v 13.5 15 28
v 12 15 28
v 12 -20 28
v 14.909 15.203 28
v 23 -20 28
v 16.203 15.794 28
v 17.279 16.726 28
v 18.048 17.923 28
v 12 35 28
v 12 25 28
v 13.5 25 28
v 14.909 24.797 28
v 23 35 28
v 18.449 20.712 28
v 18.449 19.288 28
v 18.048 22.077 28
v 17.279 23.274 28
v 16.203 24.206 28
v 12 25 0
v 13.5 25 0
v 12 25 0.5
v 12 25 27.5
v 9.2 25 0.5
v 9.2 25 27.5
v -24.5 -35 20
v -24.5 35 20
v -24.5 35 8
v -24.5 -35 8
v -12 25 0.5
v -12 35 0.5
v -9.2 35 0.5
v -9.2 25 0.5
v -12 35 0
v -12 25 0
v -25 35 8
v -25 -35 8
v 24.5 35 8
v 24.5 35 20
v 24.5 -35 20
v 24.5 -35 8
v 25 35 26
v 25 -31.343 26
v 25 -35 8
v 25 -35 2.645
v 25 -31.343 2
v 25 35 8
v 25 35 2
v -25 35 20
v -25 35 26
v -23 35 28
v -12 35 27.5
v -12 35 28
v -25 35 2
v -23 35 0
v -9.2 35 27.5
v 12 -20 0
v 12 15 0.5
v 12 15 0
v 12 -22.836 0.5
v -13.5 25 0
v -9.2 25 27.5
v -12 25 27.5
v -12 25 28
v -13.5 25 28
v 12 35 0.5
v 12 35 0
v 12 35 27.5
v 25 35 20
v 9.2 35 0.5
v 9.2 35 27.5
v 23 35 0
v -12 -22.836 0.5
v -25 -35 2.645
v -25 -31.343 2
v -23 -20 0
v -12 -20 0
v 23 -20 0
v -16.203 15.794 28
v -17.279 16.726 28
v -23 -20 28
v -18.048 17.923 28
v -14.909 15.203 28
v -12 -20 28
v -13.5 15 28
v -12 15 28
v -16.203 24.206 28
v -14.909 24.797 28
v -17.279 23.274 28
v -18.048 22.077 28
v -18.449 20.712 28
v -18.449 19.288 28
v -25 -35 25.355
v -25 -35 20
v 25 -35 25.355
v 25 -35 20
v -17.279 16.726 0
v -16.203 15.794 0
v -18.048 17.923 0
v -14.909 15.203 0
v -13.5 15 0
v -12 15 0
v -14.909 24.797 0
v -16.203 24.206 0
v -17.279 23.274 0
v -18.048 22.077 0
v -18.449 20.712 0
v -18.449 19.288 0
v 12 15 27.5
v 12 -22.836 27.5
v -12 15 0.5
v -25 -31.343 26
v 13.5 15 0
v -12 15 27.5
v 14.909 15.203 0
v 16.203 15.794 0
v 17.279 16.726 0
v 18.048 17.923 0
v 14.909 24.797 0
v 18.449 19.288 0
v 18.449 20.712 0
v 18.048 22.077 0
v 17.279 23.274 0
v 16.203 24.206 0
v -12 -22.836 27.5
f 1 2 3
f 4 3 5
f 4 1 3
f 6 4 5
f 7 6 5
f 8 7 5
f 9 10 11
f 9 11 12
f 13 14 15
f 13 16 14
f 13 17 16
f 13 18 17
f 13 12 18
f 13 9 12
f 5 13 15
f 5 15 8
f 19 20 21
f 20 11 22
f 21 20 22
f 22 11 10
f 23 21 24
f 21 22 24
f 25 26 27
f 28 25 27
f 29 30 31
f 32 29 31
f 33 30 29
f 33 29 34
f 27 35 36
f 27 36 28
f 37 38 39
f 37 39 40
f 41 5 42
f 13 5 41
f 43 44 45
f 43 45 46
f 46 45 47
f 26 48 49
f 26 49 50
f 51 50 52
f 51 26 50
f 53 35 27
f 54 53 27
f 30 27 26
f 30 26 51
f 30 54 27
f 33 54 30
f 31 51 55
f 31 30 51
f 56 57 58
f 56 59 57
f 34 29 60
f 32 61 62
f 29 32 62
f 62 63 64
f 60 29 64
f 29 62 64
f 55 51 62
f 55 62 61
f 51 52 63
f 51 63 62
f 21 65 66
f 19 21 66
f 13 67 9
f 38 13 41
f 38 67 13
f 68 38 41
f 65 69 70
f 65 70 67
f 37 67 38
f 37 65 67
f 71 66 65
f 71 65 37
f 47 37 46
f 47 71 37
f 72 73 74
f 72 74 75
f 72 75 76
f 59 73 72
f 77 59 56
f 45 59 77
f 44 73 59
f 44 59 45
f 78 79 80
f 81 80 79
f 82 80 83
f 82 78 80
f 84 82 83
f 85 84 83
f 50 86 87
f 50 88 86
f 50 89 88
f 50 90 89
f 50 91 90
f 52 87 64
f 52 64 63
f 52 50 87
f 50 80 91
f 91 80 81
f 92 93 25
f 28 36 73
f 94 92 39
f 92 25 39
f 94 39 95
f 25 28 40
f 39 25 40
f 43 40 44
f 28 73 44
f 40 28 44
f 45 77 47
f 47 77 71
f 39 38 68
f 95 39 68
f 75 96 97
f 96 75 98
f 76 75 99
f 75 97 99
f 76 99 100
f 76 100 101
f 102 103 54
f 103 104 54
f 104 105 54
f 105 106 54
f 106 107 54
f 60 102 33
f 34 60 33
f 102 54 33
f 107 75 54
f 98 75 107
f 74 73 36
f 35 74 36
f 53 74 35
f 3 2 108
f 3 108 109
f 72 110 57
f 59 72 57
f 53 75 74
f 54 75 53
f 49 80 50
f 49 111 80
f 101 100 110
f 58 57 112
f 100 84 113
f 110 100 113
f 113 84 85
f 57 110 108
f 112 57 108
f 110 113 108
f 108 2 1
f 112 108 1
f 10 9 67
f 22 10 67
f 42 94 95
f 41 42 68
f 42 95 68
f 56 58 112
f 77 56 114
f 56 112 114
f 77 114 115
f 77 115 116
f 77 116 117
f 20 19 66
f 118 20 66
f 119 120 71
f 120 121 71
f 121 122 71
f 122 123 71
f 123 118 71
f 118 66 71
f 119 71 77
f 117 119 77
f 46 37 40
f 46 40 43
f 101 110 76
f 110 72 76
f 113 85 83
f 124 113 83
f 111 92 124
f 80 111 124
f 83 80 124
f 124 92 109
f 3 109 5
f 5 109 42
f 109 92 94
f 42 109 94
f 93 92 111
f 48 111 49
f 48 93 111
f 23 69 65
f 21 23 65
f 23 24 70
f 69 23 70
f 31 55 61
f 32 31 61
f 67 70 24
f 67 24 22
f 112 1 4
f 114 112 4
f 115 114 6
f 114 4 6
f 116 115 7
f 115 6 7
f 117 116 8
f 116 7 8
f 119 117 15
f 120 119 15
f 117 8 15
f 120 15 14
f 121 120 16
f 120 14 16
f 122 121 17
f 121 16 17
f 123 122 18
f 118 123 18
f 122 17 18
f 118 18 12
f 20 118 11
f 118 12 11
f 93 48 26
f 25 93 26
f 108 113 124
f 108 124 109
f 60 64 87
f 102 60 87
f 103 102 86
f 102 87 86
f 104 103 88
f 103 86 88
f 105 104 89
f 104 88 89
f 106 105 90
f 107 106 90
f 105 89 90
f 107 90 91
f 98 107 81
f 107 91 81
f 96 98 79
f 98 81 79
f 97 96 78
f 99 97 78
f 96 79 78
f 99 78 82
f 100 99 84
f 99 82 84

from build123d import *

# Parameters (mm, degrees)
SKETCH_1_W          = 50
SKETCH_1_H          = 70
EXTRUDE_1_DEPTH     = 28
CUT_EXTRUDE_6_DEPTH = 52.322509681
CHAMFER_1_SIZE      = 15
CHAMFER_1_SIZE2     = 2.644904711
CHAMFER_2_SIZE      = 15
CHAMFER_2_SIZE2     = 2.644904711
SKETCH_6_W          = 24
SKETCH_6_H          = 0.5
CUT_EXTRUDE_7_DEPTH = 80.429213769
SKETCH_7_W          = 0.5
SKETCH_7_H          = 12
CUT_EXTRUDE_8_DEPTH = 80.429213769
CHAMFER_3_SIZE      = 2


with BuildPart() as part:
    # 草圖1 → 伸長1 (new body)
    with BuildSketch(Plane.XY):
        Rectangle(SKETCH_1_W, SKETCH_1_H)
    extrude(amount=EXTRUDE_1_DEPTH)

    # 草圖4 → 除料-伸長6 (cut, through all)
    with BuildSketch(Plane.XY.offset(28)):
        with BuildLine():
            Line((-9.2, 35), (-9.2, 25))
            Line((-9.2, 25), (-13.5, 25))
            ThreePointArc((-13.5, 25), (-18.5, 20), (-13.5, 15))
            Line((-13.5, 15), (13.5, 15))
            ThreePointArc((13.5, 15), (18.5, 20), (13.5, 25))
            Line((13.5, 25), (9.2, 25))
            Line((9.2, 25), (9.2, 35))
            Line((9.2, 35), (-9.2, 35))
        make_face()
    extrude(amount=-CUT_EXTRUDE_6_DEPTH, mode=Mode.SUBTRACT)

    # 導角1
    chamfer_1_edges = [part.edges().sort_by_distance(p)[0] for p in [
        (0, -35, 0),
    ]]
    chamfer_1_side = [part.faces().sort_by_distance(p)[0] for p in [
        (0, -4.209254903, 0),
    ]]
    chamfer(chamfer_1_edges, length=CHAMFER_1_SIZE, length2=CHAMFER_1_SIZE2, reference=chamfer_1_side[0])

    # 導角2
    chamfer_2_edges = [part.edges().sort_by_distance(p)[0] for p in [
        (0, -35, 28),
    ]]
    chamfer_2_side = [part.faces().sort_by_distance(p)[0] for p in [
        (0, -4.209254903, 28),
    ]]
    chamfer(chamfer_2_edges, length=CHAMFER_2_SIZE, length2=CHAMFER_2_SIZE2, reference=chamfer_2_side[0])

    # 草圖6 → 除料-伸長7 (cut, through all)
    with BuildSketch(Plane(origin=(0, 35, 0), x_dir=(1, 0, 0), z_dir=(0, 1, 0))):
        with Locations((0, -27.75)):
            Rectangle(SKETCH_6_W, SKETCH_6_H)
        with Locations((0, -0.25)):
            Rectangle(SKETCH_6_W, SKETCH_6_H)
    extrude(amount=-CUT_EXTRUDE_7_DEPTH, mode=Mode.SUBTRACT)

    # 草圖7 → 除料-伸長8 (cut, through all)
    with BuildSketch(Plane(origin=(0, 35, 0), x_dir=(1, 0, 0), z_dir=(0, 1, 0))):
        with Locations((-24.75, -14)):
            Rectangle(SKETCH_7_W, SKETCH_7_H)
        with Locations((24.75, -14)):
            Rectangle(SKETCH_7_W, SKETCH_7_H)
    extrude(amount=-CUT_EXTRUDE_8_DEPTH, mode=Mode.SUBTRACT)

    # 導角3
    chamfer_3_edges = [part.edges().sort_by_distance(p)[0] for p in [
        (-25, 7.5, 28),
        (25, 7.5, 0),
        (25, 7.5, 28),
        (-25, 7.5, 0),
    ]]
    chamfer(chamfer_3_edges, length=CHAMFER_3_SIZE)


solid = part.part
